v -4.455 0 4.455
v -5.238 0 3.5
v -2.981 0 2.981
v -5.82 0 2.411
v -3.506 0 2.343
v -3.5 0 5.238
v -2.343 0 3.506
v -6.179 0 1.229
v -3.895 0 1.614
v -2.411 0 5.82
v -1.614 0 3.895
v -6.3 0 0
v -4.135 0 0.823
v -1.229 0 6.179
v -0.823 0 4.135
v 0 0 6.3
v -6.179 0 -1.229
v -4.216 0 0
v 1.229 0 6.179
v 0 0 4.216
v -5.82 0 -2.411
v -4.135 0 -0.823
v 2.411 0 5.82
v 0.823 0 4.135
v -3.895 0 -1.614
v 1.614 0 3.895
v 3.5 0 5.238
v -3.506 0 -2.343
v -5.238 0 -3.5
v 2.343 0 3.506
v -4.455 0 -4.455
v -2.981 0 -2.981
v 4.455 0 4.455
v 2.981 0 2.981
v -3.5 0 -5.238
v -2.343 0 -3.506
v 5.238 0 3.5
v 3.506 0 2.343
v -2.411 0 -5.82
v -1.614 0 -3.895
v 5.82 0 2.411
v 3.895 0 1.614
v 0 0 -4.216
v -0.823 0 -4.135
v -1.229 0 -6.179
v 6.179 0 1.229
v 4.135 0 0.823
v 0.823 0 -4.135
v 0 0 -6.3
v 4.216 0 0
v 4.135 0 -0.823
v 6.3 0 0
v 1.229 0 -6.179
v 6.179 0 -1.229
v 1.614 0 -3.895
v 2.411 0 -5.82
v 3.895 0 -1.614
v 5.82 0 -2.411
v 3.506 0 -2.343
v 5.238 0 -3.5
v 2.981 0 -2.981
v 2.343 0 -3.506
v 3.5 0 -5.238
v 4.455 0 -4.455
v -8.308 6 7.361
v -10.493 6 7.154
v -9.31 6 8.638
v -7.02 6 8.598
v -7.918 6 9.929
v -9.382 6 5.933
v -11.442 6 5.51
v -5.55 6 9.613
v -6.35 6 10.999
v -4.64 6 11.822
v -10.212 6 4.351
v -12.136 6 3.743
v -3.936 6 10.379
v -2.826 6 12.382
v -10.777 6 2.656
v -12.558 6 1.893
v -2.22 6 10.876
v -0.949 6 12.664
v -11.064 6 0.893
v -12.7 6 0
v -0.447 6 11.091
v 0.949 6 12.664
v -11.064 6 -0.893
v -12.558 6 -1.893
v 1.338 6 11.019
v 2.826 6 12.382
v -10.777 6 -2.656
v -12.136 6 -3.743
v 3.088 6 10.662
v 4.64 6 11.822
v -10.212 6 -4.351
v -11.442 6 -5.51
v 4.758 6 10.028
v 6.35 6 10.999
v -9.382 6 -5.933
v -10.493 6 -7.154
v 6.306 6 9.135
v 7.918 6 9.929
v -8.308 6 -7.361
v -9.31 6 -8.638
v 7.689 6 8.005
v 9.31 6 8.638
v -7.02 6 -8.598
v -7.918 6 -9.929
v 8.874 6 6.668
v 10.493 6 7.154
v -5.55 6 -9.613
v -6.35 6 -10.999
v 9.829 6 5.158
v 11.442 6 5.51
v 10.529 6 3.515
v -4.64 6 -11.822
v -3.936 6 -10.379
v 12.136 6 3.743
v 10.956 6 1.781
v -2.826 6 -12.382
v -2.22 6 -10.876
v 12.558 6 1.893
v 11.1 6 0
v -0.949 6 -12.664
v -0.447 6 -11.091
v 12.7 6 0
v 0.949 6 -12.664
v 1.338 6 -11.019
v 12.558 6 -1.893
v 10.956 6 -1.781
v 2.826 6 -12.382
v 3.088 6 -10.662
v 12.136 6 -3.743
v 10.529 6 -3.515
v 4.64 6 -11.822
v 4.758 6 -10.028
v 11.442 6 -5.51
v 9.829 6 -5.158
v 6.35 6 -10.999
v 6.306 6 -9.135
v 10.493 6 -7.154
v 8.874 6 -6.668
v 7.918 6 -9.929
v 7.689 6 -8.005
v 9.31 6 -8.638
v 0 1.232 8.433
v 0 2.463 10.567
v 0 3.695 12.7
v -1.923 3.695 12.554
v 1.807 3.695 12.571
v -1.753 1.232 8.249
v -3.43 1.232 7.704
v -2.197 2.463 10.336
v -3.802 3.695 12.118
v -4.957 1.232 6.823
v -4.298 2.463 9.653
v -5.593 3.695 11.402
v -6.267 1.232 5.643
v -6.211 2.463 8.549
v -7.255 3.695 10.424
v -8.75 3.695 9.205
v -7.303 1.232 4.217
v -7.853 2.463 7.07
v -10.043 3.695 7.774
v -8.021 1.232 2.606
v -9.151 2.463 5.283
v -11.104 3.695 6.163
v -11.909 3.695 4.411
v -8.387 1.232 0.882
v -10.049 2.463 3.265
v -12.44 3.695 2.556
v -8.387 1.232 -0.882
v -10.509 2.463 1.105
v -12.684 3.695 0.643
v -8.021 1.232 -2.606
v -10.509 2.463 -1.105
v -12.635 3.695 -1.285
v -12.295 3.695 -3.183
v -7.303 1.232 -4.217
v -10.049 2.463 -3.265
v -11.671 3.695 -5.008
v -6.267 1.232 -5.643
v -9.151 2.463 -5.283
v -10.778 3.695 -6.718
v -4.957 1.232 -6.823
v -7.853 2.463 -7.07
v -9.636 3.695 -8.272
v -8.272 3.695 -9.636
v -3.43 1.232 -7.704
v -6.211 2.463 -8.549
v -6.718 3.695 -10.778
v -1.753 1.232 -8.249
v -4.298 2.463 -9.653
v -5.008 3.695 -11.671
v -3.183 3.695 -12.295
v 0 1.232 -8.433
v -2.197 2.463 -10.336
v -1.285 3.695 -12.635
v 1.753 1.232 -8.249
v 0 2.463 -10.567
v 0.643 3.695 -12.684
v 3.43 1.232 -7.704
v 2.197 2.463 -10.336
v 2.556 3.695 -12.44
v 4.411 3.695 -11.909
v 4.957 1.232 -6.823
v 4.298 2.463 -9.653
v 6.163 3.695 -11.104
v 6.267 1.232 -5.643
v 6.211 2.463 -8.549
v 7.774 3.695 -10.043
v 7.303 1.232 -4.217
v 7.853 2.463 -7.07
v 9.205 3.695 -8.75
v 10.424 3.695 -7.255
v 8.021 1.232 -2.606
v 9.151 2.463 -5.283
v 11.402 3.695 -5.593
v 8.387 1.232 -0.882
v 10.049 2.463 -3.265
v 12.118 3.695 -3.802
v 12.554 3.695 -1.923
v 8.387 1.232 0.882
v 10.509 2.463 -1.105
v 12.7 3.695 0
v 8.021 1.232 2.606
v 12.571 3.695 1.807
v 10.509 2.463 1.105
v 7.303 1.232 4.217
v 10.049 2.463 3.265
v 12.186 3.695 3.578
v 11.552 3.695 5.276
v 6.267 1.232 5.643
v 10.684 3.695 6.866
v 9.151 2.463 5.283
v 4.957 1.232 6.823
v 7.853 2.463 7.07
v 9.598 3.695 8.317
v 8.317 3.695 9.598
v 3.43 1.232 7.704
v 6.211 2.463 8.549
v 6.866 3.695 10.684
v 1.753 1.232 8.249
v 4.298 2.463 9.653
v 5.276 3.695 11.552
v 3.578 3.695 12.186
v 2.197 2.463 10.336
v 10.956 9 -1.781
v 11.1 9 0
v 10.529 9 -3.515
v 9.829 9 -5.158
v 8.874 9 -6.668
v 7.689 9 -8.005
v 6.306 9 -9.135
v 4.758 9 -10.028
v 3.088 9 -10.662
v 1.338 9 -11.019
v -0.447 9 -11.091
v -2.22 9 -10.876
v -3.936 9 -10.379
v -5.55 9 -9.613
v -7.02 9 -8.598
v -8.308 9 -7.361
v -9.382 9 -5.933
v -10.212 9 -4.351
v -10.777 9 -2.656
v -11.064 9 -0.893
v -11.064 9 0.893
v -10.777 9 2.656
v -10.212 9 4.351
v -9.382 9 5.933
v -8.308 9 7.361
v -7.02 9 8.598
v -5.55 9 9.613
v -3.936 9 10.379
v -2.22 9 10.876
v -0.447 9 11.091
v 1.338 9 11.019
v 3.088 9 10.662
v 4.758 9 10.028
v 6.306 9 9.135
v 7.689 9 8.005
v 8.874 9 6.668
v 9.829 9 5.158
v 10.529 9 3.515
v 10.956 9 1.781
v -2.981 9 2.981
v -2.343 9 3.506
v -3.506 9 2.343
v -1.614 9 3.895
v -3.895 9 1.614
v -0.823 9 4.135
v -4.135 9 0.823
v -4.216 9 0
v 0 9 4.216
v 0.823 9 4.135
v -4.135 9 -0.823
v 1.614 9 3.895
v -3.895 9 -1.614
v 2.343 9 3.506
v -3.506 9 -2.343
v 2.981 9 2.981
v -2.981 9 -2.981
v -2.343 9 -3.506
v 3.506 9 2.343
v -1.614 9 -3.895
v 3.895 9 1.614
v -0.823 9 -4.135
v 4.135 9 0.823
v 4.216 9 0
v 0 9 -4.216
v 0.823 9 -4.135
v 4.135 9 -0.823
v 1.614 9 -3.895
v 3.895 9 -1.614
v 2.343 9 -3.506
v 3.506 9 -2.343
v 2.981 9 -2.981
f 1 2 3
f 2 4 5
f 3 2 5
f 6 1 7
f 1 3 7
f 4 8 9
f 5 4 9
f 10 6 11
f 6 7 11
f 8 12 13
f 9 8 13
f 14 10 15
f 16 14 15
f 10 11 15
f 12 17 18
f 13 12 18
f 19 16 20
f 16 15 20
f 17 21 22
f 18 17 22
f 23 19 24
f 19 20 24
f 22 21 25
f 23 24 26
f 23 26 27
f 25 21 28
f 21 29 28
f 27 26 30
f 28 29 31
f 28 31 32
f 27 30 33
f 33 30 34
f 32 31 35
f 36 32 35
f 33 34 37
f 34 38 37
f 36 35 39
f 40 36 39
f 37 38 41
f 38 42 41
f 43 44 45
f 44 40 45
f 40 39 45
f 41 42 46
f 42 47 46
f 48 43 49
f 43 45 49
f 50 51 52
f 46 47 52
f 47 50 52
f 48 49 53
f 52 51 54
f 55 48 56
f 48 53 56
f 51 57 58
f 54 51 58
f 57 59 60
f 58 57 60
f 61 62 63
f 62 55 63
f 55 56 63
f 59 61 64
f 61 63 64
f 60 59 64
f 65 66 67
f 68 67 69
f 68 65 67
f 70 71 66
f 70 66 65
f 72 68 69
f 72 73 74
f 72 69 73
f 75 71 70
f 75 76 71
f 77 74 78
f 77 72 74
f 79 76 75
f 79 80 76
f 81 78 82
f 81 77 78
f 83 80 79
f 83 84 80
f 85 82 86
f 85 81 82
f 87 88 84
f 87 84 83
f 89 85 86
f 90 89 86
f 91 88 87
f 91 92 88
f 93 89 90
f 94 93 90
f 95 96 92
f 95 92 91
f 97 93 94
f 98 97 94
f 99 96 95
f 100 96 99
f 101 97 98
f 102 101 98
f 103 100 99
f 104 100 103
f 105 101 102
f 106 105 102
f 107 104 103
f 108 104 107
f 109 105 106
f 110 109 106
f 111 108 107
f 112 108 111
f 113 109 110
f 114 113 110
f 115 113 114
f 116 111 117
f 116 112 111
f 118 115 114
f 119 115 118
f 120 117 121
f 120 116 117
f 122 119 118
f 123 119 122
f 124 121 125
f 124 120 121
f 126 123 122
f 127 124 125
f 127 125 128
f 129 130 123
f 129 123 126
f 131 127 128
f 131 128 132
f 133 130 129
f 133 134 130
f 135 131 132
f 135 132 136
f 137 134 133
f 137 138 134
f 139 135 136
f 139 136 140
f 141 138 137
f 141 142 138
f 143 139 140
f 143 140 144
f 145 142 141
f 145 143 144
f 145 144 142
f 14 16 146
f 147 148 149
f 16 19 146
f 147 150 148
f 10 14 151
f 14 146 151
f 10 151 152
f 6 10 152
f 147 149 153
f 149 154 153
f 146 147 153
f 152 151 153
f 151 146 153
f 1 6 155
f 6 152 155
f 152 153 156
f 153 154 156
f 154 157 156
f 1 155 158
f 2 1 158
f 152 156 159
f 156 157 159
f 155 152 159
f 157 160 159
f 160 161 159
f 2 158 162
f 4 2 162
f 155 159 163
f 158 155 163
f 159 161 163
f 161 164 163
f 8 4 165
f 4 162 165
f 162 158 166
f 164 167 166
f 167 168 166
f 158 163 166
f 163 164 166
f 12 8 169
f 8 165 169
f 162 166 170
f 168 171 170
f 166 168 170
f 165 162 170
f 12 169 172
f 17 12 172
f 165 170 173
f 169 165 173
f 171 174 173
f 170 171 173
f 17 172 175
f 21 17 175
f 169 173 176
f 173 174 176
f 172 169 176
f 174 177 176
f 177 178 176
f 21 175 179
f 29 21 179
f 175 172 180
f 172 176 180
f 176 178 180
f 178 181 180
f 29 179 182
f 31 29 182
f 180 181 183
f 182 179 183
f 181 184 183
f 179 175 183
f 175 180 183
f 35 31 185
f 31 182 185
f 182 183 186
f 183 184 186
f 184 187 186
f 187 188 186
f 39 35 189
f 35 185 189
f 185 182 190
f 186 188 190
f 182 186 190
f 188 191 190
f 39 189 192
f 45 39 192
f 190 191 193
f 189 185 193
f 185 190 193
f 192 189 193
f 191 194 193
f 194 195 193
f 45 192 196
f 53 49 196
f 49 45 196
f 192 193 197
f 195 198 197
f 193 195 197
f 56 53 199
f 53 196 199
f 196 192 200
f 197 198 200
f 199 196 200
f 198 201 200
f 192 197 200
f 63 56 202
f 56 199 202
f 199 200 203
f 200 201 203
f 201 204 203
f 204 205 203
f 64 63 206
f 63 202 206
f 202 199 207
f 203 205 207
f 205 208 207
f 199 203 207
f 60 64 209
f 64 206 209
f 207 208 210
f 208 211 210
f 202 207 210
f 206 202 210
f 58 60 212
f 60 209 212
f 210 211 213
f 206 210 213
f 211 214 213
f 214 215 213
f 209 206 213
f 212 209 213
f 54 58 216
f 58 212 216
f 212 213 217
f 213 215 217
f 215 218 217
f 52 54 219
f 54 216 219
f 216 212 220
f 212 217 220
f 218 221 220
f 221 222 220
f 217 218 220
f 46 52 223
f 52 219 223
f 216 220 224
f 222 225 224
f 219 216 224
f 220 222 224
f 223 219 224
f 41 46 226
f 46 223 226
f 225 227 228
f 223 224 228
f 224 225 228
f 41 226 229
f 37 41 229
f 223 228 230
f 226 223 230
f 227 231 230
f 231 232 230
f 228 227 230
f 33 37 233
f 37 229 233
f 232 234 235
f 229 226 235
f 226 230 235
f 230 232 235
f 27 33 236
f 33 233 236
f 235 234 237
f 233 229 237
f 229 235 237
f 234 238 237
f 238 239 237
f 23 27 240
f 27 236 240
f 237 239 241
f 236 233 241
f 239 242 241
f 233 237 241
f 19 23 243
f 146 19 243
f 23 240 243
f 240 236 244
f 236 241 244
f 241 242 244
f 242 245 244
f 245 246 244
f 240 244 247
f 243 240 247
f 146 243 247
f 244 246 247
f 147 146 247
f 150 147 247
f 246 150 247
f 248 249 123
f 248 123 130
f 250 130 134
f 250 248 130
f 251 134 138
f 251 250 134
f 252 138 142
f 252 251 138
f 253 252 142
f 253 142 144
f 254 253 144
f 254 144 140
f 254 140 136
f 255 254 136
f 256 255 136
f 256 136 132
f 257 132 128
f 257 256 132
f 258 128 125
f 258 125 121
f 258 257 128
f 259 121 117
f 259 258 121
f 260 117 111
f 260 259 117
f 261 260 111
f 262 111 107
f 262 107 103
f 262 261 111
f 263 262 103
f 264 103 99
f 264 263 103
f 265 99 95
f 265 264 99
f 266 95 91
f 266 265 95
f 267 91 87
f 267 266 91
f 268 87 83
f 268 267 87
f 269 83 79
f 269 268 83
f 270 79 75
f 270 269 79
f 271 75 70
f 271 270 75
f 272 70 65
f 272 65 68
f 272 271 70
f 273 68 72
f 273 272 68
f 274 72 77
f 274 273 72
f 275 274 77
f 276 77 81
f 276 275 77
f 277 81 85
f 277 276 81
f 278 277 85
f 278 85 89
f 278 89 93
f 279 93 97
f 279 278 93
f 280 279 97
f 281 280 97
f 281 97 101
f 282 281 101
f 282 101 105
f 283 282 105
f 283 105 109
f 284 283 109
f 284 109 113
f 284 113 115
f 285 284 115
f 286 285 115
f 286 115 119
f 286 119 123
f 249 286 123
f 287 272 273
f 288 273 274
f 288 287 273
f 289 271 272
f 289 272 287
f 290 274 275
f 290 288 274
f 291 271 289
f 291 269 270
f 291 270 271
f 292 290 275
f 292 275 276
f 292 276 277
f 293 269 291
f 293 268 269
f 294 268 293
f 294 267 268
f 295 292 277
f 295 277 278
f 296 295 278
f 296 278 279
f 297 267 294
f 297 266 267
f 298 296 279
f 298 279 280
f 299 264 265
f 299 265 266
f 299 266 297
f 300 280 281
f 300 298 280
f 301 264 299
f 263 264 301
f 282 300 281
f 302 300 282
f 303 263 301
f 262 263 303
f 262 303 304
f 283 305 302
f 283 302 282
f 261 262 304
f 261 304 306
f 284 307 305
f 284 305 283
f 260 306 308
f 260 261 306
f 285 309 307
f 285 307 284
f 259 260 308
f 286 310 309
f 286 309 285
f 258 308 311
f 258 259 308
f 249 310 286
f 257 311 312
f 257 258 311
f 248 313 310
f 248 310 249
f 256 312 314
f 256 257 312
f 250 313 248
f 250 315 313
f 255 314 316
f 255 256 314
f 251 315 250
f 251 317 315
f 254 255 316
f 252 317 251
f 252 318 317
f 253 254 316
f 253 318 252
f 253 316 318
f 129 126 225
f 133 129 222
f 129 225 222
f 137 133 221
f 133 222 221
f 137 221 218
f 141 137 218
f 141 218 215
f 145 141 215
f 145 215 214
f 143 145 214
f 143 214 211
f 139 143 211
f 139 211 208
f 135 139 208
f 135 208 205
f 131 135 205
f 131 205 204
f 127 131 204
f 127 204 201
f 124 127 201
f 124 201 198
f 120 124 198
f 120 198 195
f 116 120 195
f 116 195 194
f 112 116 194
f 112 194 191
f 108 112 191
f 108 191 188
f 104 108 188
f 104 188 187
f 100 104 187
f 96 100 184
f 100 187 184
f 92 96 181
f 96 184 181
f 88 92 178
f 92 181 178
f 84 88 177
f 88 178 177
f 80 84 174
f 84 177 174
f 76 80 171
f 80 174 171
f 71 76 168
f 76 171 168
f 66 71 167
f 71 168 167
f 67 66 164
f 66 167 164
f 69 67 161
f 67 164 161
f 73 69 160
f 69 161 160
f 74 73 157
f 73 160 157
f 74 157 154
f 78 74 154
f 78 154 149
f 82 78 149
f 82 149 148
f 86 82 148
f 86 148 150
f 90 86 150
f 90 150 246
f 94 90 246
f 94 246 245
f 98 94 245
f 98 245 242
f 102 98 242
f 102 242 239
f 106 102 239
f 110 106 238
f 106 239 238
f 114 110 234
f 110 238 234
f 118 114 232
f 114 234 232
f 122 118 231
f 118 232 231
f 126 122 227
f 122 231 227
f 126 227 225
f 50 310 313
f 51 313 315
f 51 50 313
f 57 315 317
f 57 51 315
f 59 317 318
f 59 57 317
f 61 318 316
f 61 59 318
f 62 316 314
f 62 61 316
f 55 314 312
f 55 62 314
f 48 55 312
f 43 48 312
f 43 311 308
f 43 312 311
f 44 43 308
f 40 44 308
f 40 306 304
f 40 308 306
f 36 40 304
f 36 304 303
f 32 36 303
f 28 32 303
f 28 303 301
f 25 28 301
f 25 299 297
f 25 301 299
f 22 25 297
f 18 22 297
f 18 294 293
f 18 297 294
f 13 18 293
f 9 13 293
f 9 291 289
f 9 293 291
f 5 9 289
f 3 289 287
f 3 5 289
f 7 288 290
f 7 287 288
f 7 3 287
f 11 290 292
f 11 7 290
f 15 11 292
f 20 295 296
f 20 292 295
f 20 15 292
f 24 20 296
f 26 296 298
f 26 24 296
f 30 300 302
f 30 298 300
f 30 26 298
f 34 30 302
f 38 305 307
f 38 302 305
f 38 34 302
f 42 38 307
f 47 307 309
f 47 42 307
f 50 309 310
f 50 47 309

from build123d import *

# Parameters (mm, degrees)
SKETCH1_R         = 12.7
EXTRUDE1_DEPTH    = 9
SKETCH2_R         = 4.2164
EXTRUDE2_DEPTH    = 25.4
SKETCH3_OUTSIDE_W = 34.806
SKETCH3_OUTSIDE_H = 34.806
SKETCH3_OUTSIDE_R = 11.1
EXTRUDE3_DEPTH    = 3


with BuildPart() as part:
    # Sketch1 → Extrude1 (new body)
    with BuildSketch(Plane(origin=(0, 0, 0), x_dir=(1, 0, 0), z_dir=(0, 1, 0))):
        Circle(SKETCH1_R)
    extrude(amount=EXTRUDE1_DEPTH)

    # Sketch2 → Extrude2 (cut)
    with BuildSketch(Plane(origin=(0, 0, 0), x_dir=(1, 0, 0), z_dir=(0, 1, 0))):
        Circle(SKETCH2_R)
    extrude(amount=EXTRUDE2_DEPTH, mode=Mode.SUBTRACT)

    # Sketch3 outside → Extrude3 (cut)
    with BuildSketch(Plane(origin=(0, 9, 0), x_dir=(1, 0, 0), z_dir=(0, 1, 0))):
        Rectangle(SKETCH3_OUTSIDE_W, SKETCH3_OUTSIDE_H)
        Circle(SKETCH3_OUTSIDE_R, mode=Mode.SUBTRACT)
    extrude(amount=-EXTRUDE3_DEPTH, mode=Mode.SUBTRACT)

    # Sketch6 → Cut-Revolve1 (revolve, cut)
    with BuildSketch(Plane(origin=(0, 0, 0), x_dir=(0, 0, -1), z_dir=(1, 0, 0))):
        Polygon((-1.103847577, -3), (-15, 5.022947342), (-15, -3), align=None)
    revolve(axis=Axis((0, 0, 0), (0, -1, 0)), mode=Mode.SUBTRACT)


solid = part.part
